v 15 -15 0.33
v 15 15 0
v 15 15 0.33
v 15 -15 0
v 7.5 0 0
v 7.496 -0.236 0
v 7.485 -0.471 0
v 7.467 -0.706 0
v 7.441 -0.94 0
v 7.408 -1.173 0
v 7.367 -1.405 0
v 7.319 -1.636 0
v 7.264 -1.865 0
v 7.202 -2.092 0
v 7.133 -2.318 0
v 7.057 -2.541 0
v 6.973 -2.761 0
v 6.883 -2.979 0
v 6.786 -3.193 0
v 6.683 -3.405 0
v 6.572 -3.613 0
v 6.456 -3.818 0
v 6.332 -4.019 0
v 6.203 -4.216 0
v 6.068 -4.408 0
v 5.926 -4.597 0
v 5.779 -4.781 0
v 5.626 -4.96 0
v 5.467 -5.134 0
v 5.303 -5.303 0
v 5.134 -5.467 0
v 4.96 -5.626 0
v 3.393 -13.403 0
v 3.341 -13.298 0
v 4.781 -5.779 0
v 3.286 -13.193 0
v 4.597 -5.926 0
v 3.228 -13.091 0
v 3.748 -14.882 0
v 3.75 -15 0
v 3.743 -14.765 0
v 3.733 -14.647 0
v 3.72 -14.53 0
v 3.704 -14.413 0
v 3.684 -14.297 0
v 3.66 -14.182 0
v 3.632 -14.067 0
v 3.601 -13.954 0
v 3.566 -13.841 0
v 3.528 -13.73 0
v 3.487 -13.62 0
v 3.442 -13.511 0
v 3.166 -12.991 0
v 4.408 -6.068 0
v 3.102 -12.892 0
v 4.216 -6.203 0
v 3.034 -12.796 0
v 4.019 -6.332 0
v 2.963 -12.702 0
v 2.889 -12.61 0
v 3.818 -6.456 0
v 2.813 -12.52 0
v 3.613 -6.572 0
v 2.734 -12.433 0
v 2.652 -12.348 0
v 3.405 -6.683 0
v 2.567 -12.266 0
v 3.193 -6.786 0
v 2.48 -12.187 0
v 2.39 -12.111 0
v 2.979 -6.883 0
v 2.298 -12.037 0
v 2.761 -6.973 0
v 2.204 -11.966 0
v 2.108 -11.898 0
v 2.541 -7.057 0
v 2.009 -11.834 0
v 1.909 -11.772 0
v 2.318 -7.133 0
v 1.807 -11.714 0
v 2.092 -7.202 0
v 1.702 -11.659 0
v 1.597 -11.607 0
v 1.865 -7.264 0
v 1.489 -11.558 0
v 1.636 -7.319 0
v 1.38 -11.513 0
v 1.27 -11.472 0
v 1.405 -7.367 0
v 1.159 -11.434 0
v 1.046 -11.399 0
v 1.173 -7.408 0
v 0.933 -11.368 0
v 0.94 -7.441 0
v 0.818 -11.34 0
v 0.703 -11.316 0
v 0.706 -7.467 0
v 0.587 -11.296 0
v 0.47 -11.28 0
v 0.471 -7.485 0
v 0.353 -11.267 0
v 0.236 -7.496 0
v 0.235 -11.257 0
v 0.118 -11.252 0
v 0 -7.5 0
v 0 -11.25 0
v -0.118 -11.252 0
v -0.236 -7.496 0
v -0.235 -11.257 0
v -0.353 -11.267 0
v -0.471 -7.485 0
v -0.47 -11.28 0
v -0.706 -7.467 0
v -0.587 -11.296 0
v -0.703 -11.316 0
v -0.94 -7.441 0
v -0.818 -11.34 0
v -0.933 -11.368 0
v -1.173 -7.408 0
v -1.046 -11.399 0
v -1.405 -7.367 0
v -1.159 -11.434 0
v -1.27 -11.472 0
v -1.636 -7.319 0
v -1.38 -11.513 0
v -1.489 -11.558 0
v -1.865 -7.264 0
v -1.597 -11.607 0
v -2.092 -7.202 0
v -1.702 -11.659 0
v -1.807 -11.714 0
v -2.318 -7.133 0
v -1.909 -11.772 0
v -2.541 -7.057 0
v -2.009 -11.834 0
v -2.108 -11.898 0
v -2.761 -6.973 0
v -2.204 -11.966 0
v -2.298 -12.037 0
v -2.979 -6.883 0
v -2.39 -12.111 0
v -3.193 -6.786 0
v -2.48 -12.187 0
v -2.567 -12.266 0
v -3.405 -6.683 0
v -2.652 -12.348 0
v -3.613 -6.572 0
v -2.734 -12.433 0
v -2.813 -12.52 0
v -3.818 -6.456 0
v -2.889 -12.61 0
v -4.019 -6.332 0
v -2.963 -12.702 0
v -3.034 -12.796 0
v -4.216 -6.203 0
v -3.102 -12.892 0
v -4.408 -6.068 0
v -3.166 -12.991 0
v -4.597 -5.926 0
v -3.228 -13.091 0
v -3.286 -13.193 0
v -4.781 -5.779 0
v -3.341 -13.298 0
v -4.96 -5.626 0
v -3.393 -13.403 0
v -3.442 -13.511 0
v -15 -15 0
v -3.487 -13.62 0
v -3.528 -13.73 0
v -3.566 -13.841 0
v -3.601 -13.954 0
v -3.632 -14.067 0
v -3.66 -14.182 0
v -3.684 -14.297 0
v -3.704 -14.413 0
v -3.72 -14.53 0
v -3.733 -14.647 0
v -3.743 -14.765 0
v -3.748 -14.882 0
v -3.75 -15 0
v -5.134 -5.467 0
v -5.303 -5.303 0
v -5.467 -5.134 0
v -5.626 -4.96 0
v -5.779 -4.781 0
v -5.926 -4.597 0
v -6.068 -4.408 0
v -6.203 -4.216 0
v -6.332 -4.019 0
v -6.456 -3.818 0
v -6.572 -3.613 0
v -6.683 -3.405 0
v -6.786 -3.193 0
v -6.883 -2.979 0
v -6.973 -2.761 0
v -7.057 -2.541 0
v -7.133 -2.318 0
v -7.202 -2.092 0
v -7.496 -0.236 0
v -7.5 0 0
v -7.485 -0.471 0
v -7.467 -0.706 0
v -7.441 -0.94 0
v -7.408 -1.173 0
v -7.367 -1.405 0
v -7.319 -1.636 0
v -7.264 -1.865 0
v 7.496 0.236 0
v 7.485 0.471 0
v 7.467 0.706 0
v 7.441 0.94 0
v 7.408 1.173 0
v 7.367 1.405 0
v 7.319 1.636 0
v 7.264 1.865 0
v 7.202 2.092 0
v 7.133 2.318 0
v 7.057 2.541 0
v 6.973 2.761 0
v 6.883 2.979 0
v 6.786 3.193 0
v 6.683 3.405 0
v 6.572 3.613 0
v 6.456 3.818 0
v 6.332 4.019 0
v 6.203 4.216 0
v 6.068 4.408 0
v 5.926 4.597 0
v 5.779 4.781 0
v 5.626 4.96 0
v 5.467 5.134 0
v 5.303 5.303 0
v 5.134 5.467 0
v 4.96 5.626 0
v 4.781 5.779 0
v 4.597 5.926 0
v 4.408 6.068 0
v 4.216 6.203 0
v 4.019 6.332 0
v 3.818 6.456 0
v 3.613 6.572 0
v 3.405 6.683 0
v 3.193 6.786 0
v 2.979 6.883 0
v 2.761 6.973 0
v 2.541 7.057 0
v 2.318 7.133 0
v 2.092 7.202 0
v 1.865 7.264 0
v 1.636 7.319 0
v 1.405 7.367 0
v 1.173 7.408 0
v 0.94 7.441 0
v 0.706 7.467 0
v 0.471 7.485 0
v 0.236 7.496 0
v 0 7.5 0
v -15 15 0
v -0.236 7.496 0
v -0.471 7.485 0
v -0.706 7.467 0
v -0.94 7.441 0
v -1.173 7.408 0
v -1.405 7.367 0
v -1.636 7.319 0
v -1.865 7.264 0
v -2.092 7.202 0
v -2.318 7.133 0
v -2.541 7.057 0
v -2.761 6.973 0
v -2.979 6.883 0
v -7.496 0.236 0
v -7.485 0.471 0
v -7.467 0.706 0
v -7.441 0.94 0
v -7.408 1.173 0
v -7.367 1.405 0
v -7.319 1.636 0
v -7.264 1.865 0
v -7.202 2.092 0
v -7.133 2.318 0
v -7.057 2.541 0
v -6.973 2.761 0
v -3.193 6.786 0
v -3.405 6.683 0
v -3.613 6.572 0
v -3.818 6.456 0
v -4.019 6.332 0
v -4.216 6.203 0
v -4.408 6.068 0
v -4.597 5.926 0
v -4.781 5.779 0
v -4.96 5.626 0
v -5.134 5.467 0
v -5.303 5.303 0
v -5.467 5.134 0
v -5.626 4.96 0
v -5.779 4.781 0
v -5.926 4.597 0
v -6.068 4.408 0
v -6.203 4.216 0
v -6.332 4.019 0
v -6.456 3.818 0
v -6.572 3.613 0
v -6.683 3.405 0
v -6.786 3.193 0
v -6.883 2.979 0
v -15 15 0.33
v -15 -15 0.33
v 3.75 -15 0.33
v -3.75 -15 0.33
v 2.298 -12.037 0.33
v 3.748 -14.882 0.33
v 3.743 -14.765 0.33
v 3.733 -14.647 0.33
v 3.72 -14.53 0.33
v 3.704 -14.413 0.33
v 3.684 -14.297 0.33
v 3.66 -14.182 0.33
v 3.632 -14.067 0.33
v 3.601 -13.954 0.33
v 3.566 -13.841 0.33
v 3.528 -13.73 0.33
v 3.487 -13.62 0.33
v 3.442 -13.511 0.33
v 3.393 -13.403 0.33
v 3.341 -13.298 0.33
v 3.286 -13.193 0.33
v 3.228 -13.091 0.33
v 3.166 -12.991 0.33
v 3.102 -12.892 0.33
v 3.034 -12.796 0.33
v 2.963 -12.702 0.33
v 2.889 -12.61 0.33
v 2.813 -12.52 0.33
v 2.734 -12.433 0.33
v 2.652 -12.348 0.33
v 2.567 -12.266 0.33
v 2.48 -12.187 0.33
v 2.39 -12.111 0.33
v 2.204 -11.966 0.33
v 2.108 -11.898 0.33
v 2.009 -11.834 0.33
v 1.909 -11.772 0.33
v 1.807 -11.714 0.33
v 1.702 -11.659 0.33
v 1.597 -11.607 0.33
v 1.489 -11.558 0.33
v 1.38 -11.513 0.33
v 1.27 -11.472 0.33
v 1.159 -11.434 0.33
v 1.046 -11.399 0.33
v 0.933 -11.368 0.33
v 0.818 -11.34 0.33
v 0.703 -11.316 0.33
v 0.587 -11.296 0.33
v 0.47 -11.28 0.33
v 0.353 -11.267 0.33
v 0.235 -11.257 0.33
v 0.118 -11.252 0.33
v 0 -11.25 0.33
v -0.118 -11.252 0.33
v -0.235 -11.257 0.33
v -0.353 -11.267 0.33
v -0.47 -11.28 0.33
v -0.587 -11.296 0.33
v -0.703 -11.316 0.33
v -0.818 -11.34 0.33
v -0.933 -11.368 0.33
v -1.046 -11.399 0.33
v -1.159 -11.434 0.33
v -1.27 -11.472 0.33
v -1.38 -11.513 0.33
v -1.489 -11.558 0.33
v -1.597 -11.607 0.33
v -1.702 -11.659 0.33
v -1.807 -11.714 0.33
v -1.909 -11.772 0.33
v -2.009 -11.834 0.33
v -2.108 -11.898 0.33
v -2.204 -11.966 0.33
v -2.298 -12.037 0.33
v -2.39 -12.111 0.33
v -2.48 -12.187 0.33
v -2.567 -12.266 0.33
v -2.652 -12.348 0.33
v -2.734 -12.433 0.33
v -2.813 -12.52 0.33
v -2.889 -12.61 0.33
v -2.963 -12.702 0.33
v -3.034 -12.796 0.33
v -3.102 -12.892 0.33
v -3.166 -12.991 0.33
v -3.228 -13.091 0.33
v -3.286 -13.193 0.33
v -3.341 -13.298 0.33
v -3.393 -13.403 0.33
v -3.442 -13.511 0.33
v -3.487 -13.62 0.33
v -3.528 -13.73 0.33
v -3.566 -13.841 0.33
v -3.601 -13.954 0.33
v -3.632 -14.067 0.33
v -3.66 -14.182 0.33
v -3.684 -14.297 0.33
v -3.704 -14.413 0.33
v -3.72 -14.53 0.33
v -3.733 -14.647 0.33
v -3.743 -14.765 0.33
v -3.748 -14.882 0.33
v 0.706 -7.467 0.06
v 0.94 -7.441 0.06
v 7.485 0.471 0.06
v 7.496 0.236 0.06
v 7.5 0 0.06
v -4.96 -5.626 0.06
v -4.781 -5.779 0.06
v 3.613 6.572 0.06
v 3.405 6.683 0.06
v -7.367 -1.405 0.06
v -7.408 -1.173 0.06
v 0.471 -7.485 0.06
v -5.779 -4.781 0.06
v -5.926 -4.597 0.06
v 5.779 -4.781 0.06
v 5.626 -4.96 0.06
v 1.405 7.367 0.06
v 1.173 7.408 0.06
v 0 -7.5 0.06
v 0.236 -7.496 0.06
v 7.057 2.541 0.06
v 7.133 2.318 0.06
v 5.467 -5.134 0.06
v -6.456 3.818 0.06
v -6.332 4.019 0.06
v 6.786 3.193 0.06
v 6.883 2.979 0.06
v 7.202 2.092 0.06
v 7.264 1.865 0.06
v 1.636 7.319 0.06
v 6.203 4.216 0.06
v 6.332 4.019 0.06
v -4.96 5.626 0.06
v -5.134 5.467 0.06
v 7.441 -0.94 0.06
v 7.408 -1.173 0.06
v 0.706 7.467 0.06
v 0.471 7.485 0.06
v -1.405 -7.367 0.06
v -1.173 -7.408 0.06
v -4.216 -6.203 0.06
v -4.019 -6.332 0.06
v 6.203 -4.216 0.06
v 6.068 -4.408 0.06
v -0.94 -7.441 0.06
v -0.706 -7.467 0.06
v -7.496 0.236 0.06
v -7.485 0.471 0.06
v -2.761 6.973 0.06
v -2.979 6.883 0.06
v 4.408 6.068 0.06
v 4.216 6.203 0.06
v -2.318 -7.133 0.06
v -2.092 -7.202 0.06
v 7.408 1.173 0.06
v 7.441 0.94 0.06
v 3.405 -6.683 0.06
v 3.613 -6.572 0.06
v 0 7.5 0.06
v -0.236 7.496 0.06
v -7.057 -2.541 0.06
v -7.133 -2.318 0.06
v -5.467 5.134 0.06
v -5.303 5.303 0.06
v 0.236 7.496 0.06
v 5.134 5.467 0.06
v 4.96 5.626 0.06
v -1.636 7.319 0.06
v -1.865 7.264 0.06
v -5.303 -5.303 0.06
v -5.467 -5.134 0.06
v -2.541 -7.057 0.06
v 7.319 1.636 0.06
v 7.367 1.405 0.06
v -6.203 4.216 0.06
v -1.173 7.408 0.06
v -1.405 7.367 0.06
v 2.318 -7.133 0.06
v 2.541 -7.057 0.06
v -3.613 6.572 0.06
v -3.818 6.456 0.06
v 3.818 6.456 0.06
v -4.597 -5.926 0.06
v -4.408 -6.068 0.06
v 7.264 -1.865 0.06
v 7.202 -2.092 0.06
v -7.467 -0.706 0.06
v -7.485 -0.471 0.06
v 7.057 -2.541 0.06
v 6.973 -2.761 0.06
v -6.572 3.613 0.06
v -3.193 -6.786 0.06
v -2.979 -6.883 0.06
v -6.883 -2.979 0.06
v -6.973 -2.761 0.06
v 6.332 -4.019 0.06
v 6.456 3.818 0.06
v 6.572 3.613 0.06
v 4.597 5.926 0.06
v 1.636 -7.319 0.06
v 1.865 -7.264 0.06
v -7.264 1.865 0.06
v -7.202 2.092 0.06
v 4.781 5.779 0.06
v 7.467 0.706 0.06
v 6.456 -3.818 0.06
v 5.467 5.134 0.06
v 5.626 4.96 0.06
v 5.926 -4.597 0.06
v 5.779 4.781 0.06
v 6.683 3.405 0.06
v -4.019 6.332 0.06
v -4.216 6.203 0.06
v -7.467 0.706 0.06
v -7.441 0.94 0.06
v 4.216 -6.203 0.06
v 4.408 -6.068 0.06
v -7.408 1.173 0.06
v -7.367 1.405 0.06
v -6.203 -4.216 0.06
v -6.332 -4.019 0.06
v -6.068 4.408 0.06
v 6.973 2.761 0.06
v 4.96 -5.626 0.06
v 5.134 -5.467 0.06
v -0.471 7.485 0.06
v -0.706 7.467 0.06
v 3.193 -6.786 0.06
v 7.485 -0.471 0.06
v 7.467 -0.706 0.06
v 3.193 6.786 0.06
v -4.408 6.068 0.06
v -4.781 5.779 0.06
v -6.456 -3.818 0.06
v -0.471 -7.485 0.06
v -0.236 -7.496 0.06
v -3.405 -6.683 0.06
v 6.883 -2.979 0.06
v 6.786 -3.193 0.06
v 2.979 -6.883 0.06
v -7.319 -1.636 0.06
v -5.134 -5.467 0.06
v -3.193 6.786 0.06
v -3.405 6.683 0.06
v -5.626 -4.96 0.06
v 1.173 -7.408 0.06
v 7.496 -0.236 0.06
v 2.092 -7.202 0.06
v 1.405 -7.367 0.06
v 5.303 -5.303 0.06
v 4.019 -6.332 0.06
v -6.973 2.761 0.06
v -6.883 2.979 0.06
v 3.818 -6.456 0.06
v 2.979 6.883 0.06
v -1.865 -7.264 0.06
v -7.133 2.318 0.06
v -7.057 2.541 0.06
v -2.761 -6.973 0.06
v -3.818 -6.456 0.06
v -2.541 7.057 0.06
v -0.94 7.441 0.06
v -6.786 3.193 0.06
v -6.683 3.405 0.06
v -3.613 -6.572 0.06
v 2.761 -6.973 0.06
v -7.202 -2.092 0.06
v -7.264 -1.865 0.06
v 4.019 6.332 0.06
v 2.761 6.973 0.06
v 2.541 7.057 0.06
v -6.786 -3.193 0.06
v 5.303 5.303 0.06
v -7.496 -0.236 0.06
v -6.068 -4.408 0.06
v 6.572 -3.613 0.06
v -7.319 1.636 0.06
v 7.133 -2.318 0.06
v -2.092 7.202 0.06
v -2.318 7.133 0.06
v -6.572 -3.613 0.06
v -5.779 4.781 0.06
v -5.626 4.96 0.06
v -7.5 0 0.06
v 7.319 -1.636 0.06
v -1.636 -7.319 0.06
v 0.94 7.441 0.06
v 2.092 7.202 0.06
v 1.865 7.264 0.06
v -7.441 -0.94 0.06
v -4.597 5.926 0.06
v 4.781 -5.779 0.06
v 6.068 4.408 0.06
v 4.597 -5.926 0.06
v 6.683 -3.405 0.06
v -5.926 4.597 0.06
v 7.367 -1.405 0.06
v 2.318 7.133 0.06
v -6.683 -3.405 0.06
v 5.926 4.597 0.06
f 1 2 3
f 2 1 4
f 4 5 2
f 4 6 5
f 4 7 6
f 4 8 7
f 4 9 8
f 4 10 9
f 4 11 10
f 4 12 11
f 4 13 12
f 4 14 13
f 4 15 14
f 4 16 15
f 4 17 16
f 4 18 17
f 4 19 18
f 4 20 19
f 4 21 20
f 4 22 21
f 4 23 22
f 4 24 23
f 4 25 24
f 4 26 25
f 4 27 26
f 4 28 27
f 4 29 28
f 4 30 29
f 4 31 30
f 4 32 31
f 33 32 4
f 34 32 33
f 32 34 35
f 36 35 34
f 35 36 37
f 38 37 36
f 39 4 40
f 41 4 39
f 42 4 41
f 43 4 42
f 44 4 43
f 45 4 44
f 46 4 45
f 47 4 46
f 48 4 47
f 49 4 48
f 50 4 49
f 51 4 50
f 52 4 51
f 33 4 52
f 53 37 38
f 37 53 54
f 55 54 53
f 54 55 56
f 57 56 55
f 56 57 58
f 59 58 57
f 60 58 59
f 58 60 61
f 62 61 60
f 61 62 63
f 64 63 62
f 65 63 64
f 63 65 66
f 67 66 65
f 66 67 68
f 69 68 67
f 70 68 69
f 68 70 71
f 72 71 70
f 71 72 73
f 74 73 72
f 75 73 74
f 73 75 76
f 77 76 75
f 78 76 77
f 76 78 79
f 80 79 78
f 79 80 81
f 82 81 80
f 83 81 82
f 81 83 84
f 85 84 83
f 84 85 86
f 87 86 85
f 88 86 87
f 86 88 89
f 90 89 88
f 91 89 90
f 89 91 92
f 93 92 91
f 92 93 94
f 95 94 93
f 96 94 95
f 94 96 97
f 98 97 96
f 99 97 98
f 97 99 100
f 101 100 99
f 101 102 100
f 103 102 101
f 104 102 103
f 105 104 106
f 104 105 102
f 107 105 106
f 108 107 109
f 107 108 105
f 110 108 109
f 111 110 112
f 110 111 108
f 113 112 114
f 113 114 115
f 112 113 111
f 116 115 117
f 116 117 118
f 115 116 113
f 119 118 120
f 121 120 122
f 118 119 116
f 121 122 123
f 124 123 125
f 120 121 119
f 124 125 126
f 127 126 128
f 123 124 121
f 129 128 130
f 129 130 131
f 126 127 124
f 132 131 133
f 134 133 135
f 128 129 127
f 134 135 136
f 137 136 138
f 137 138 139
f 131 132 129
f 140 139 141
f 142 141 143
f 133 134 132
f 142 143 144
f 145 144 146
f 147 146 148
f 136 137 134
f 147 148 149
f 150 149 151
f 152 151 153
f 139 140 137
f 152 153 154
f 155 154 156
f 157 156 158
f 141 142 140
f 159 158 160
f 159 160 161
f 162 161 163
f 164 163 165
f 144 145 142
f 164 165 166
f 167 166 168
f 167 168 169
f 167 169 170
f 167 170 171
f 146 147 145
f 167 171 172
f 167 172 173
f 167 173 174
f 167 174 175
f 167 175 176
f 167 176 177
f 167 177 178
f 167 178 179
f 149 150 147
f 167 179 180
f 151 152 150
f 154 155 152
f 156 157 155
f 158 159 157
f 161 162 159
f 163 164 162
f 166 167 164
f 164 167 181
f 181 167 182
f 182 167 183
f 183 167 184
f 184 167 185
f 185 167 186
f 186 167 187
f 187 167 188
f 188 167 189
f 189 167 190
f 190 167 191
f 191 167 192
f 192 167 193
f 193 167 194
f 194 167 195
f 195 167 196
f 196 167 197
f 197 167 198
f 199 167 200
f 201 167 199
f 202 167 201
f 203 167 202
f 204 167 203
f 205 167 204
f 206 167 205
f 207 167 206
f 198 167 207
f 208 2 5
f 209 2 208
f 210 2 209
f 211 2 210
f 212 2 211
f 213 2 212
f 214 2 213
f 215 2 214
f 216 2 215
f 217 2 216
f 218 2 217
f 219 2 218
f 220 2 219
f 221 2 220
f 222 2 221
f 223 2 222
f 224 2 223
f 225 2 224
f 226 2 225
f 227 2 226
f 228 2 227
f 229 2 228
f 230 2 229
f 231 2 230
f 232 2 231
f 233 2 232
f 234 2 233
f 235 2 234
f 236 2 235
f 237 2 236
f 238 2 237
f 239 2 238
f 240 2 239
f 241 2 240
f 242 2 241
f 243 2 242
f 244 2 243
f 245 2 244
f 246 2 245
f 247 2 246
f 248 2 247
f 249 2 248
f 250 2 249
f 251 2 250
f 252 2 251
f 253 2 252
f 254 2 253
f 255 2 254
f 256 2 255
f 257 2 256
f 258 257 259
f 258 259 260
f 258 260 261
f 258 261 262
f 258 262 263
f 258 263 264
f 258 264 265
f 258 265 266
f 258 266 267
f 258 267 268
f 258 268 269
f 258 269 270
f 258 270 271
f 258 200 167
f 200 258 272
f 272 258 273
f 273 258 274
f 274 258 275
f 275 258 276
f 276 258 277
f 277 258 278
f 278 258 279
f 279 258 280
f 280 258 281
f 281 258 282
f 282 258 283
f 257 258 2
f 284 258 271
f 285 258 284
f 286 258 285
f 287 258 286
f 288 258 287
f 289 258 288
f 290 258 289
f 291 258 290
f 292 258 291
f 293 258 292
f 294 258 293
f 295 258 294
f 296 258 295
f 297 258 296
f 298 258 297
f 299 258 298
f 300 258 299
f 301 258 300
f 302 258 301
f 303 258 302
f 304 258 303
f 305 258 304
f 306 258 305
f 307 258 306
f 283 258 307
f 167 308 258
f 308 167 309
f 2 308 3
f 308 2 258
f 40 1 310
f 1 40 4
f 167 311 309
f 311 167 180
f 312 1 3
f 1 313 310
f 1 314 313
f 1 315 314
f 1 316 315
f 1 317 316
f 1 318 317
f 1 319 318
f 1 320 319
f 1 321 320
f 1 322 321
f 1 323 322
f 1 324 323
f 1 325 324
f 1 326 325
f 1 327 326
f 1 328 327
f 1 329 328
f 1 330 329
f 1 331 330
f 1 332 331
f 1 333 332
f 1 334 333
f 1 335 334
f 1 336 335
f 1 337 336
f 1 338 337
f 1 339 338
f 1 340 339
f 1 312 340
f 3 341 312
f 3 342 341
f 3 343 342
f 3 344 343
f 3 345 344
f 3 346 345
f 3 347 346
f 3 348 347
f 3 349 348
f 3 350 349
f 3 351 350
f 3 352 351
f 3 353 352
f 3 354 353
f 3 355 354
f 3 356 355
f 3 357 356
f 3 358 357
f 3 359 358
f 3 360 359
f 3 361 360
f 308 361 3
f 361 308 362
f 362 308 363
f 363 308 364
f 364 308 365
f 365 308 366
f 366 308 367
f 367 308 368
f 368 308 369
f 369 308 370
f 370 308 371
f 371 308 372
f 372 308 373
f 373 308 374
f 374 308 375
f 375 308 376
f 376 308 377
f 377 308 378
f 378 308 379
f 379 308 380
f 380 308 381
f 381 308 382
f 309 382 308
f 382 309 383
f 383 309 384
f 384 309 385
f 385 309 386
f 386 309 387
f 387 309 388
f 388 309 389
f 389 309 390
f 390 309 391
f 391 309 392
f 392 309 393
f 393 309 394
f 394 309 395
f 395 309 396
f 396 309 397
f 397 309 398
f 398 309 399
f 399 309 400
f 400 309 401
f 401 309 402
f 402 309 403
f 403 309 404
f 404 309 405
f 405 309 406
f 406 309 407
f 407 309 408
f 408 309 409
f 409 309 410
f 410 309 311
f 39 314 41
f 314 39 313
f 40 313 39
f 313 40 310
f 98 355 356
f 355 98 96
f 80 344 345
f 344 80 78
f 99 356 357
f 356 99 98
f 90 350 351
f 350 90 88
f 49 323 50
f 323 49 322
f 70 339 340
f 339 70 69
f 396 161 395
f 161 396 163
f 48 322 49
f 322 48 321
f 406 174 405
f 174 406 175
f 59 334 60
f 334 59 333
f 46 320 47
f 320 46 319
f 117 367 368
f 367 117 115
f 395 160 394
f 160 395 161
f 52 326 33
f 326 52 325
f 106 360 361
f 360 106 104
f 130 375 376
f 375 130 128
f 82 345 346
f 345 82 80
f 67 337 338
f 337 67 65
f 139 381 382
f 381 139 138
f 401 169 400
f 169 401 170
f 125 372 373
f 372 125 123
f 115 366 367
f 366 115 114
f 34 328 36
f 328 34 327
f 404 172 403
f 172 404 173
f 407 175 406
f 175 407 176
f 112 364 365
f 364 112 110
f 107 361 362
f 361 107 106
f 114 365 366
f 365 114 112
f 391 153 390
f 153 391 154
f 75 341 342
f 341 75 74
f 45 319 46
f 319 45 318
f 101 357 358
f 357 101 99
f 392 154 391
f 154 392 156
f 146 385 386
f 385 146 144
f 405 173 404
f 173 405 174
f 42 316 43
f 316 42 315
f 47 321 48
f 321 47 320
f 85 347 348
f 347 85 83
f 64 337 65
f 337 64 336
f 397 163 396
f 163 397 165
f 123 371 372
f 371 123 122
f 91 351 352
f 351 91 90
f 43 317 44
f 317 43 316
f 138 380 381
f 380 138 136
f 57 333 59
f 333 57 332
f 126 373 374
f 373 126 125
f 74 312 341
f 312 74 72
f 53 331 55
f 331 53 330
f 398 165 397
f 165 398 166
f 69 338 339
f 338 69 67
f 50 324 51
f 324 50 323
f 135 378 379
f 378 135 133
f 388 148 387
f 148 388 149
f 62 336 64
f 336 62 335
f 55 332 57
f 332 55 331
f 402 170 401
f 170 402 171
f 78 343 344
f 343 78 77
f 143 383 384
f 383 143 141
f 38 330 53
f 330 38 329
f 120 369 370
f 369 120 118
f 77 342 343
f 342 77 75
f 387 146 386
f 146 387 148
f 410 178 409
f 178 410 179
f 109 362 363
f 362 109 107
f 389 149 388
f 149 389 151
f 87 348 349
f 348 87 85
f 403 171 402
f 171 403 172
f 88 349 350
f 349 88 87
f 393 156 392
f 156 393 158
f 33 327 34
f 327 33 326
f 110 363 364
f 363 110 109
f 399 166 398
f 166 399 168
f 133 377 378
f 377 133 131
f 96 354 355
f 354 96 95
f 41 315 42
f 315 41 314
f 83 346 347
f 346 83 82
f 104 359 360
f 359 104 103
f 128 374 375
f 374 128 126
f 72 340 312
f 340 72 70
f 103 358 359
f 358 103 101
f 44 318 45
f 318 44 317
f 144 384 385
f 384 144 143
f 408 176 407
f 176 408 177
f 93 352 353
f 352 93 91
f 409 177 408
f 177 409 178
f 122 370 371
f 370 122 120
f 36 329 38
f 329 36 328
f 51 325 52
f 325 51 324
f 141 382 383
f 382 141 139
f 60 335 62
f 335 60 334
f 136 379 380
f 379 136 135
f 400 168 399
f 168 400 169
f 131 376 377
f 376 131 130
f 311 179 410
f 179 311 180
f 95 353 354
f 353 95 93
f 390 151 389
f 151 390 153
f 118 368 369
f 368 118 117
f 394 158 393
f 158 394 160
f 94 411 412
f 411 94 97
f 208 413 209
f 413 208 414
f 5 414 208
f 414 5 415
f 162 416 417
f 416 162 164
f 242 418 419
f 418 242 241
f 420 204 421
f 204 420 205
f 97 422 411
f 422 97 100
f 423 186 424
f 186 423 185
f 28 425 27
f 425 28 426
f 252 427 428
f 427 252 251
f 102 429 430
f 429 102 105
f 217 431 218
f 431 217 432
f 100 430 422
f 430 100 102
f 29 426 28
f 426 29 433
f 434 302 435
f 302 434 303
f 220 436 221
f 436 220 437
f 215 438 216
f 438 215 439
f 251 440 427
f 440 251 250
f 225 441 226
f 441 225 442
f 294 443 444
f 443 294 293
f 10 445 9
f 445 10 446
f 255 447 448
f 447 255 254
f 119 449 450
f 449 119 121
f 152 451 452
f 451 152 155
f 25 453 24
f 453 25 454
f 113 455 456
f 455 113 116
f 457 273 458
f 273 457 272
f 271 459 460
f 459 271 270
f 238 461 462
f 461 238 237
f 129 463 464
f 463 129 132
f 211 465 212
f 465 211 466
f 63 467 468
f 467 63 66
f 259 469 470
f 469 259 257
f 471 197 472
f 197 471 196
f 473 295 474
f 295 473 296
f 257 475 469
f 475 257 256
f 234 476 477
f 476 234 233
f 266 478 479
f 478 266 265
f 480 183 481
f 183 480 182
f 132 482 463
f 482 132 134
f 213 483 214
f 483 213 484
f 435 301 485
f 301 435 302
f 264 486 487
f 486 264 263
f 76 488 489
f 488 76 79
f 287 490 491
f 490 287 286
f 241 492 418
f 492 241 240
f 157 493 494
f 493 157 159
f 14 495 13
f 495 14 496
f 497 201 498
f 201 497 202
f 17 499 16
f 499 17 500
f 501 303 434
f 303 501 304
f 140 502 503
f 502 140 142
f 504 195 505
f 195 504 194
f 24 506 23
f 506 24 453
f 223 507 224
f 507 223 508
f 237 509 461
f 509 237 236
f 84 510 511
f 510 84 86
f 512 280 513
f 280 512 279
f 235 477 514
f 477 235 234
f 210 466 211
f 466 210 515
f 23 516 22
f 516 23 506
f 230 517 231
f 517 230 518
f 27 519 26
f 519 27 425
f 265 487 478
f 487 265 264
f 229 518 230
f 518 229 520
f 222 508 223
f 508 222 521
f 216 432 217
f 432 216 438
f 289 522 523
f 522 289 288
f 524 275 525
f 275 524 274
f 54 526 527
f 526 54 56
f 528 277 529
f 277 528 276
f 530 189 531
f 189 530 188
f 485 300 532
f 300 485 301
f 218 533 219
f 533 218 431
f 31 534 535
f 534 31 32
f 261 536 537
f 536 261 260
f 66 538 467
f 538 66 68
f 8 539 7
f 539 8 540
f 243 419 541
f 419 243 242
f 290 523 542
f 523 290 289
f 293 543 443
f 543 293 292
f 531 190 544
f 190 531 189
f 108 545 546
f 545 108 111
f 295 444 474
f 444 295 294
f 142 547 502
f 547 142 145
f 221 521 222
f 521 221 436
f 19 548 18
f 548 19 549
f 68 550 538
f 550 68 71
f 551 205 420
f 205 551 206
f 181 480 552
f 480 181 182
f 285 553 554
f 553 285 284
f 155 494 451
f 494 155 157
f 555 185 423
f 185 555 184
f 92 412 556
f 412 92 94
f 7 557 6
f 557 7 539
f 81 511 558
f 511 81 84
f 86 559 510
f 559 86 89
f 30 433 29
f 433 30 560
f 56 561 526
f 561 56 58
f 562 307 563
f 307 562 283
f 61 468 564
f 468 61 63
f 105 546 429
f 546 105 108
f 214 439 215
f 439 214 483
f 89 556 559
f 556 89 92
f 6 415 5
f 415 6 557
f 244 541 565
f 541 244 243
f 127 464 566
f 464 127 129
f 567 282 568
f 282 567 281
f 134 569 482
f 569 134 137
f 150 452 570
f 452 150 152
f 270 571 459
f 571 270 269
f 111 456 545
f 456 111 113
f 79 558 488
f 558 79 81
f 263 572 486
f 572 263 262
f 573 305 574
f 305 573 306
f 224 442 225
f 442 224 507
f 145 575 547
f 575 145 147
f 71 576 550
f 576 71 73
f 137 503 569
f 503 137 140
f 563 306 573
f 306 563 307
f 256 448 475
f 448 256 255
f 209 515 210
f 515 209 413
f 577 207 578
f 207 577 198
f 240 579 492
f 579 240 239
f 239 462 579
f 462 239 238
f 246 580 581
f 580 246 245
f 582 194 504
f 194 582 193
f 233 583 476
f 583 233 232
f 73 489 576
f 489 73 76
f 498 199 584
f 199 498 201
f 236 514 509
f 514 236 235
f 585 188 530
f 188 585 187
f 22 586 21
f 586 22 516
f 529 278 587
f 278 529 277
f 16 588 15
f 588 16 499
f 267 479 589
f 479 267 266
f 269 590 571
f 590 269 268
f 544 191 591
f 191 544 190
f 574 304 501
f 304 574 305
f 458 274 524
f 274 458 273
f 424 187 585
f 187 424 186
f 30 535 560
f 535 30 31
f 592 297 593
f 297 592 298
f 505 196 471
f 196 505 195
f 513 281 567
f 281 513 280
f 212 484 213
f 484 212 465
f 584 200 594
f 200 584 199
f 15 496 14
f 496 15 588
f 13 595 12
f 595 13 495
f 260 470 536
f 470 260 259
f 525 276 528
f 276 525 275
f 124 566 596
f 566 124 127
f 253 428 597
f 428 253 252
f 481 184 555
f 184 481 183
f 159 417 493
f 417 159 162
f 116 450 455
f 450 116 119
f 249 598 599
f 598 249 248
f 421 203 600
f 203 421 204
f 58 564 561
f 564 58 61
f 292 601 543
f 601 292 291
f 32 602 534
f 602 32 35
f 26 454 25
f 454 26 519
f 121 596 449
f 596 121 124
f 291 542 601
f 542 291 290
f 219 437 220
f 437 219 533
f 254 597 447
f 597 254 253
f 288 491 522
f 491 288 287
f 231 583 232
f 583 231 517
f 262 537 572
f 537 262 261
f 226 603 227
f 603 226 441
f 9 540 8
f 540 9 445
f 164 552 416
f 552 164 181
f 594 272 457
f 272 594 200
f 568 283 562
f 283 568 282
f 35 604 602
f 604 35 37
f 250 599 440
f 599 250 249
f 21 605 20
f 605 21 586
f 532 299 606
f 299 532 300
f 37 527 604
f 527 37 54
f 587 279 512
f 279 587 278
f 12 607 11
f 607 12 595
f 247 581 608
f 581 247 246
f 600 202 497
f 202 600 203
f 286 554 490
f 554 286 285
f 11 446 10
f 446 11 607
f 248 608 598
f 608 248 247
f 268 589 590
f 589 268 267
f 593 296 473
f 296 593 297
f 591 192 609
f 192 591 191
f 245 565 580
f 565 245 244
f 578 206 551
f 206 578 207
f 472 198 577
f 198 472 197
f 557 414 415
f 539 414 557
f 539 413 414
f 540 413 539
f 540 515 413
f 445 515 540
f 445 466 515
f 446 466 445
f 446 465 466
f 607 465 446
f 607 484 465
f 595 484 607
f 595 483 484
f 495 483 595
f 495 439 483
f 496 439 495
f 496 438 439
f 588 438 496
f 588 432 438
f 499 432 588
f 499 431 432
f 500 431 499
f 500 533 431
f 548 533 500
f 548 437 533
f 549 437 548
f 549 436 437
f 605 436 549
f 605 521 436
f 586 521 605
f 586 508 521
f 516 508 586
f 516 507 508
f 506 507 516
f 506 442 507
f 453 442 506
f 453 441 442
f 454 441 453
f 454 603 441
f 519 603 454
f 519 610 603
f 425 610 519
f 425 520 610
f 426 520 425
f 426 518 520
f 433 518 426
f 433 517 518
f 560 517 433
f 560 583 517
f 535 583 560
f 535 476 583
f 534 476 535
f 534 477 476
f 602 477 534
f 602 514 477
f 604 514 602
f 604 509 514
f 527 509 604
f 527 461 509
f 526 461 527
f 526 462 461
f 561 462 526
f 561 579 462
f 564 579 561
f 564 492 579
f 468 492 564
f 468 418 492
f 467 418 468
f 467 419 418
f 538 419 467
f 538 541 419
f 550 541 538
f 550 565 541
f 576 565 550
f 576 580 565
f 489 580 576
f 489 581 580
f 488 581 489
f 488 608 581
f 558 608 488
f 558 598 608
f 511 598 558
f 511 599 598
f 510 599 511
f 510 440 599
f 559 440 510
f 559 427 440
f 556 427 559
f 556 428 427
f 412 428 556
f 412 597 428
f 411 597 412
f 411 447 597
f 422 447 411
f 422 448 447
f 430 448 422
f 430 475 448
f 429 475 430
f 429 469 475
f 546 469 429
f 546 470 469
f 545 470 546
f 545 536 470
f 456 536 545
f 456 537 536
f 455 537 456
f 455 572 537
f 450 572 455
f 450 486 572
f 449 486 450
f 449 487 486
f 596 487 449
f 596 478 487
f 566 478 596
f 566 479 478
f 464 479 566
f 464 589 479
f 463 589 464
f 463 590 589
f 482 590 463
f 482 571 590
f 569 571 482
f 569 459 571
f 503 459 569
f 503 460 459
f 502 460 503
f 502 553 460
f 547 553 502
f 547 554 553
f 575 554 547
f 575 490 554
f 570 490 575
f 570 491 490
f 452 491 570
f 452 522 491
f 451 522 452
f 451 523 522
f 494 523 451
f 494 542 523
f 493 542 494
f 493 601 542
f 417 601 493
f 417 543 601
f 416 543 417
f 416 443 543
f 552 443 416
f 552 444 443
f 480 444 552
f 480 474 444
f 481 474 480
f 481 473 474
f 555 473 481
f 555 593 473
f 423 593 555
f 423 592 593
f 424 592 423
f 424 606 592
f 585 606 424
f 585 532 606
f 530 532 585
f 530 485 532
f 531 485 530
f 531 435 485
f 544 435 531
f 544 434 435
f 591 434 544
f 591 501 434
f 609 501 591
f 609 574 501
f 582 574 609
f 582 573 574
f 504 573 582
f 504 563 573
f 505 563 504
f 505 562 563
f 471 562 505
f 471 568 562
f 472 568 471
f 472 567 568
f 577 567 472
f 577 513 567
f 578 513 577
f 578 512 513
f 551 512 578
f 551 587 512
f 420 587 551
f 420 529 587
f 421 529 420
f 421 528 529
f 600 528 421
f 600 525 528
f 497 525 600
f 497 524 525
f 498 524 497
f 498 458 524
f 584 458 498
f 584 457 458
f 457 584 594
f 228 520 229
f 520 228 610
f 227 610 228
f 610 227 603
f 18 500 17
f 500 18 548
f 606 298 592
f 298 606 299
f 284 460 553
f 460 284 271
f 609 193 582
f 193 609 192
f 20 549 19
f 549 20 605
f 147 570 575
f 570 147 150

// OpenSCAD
$fn=200;

x=230;
y=170;
s=30;
t=.32;
b=20; // border distance
nl=1;

l=.6;

//circles();
//squares();
//bigcircle();
//bigx();

//p3();
center();

//p1();
//p2();
//p4();
//c3();


//%translate([-x/2,-y/2,0]) cube([x,y,.1]);

module center(){
    a=45;
    difference(){
        union(){
            translate([-s/2,-s/2,0])
            cube([s,s,t]);
            
            hull(){
                translate([-s/2,-s/2, t])
                cube([s,s,0.01]);
                
                translate([-s/2,-s/2, nl*t-t])
                cube([s,s+cos(a)*((nl*t)-t), t]);
            }
        }
        
        // front
        translate([0,-s/2, -.1])
        cylinder(d=s/4,h=nl*t*4);
        
        // center hole
        translate([0, 0, -.1])
        cylinder(d=s/2,h=(nl*t)/2);
    }
}    

module c3(){
    // Center
    difference(){
        translate([-s/2,-s/2,0])
        cube([s,s,t]);

        translate([0,-s/2,-.1])
        cylinder(d=5,h=t+1);
    }
    // Left
    translate([-x/2+s/2+b,0,0])
    difference(){
        translate([-s/2,-s/2,0])
        cube([s,s,t]);

        translate([0,-s/2,-.1])
        cylinder(d=5,h=t+1);
    }
    // Right
    translate([x/2-s/2-b,0,0])
    difference(){
        translate([-s/2,-s/2,0])
        cube([s,s,t]);

        translate([0,-s/2,-.1])
        cylinder(d=5,h=t+1);
    }
}


module p1(){
    // Center
    difference(){
        translate([-s/2,-s/2,0])
        cube([s,s,t]);

        translate([0,-s/2,-.1])
        cylinder(d=5,h=t+1);
    }
}
module p2(){
    // Left
    translate([-x/2+s/2+b,0,0])
    difference(){
        translate([-s/2,-s/2,0])
        cube([s,s,t]);

        translate([0,-s/2,-.1])
        cylinder(d=5,h=t+1);
    }
    // Right
    translate([x/2-s/2-b,0,0])
    difference(){
        translate([-s/2,-s/2,0])
        cube([s,s,t]);

        translate([0,-s/2,-.1])
        cylinder(d=5,h=t+1);
    }
}

module p4(){
    // Front 
    translate([-s/2,-y/2+b,0])
    cube([s,s,t]);    
    // Back 
    translate([-s/2,y/2-s-b,0])
    cube([s,s,t]);    
    // Left
    translate([-x/2+b,-s/2,0])
    cube([s,s,t]);    
    // Right
    translate([x/2-b-s,-s/2,0])
    cube([s,s,t]);        
}
module p3(){
    // Front 
    translate([-s/2,-y/2+b,0])
    difference(){
        cube([s,s,t]);    

        translate([s/2,0,-.1])
        cylinder(d=5,h=t+1);
    }
    // Back Left
    translate([-x/2+b,y/2-s-b,0])
    difference(){
        cube([s,s,t]);    

        translate([s/2,0,-.1])
        cylinder(d=5,h=t+1);
    }
    // Back Right
    translate([x/2-b-s,y/2-s-b,0])
    difference(){
        cube([s,s,t]);    

        translate([s/2,0,-.1])
        cylinder(d=5,h=t+1);
    }
}

module bigcircle(){
    difference(){
        cylinder(d=y, h=t);
        
        translate([0,0,-.1])
        cylinder(d=y-s, h=1);
    }
}

module bigx(){
    hull(){
        // Front Left
        translate([-x/2,-y/2,0])
        cube([s,s,t]);    
        // Back Right
        translate([x/2-s,y/2-s,0])
        cube([s,s,t]);    
    }

    hull(){
        // Front Right
        translate([x/2-s,-y/2,0])
        cube([s,s,t]);
        // Back Left
        translate([-x/2,y/2-s,0])
        cube([s,s,t]);    
    }
    
}
module squares(){
    // Front Left
    translate([-x/2,-y/2,0])
    cube([s,s,t]);    
    // Back Right
    translate([x/2-s,y/2-s,0])
    cube([s,s,t]);    
    // Front Right
    translate([x/2-s,-y/2,0])
    cube([s,s,t]);
    // Back Left
    translate([-x/2,y/2-s,0])
    cube([s,s,t]);    
    
    // Center
    translate([-s/2,-s/2,0])
    cube([s,s,t]);
}
module circles(){
    // Front Left
    translate([-x/2+s/2,-y/2+s/2,0])
    cylinder(d=s,h=t);
    // Front Right
    translate([x/2-s/2,-y/2+s/2,0])
    cylinder(d=s,h=t);
    // Back Left
    translate([-x/2+s/2,y/2-s/2,0])
    cylinder(d=s,h=t);
    // Back Right
    translate([x/2-s/2,y/2-s/2,0])
    cylinder(d=s,h=t);

    // Center
    cylinder(d=s,h=t);
}


/* Line
difference(){
    translate([-x/2+s/2,-y/2+s/2,0])
    cube([x-s,y-s,t]);

    translate([-x/2+s/2+l,-y/2+s/2+l,-.1])
    cube([x-s-l*2,y-s-l*2,t*2]);
}
/**/
